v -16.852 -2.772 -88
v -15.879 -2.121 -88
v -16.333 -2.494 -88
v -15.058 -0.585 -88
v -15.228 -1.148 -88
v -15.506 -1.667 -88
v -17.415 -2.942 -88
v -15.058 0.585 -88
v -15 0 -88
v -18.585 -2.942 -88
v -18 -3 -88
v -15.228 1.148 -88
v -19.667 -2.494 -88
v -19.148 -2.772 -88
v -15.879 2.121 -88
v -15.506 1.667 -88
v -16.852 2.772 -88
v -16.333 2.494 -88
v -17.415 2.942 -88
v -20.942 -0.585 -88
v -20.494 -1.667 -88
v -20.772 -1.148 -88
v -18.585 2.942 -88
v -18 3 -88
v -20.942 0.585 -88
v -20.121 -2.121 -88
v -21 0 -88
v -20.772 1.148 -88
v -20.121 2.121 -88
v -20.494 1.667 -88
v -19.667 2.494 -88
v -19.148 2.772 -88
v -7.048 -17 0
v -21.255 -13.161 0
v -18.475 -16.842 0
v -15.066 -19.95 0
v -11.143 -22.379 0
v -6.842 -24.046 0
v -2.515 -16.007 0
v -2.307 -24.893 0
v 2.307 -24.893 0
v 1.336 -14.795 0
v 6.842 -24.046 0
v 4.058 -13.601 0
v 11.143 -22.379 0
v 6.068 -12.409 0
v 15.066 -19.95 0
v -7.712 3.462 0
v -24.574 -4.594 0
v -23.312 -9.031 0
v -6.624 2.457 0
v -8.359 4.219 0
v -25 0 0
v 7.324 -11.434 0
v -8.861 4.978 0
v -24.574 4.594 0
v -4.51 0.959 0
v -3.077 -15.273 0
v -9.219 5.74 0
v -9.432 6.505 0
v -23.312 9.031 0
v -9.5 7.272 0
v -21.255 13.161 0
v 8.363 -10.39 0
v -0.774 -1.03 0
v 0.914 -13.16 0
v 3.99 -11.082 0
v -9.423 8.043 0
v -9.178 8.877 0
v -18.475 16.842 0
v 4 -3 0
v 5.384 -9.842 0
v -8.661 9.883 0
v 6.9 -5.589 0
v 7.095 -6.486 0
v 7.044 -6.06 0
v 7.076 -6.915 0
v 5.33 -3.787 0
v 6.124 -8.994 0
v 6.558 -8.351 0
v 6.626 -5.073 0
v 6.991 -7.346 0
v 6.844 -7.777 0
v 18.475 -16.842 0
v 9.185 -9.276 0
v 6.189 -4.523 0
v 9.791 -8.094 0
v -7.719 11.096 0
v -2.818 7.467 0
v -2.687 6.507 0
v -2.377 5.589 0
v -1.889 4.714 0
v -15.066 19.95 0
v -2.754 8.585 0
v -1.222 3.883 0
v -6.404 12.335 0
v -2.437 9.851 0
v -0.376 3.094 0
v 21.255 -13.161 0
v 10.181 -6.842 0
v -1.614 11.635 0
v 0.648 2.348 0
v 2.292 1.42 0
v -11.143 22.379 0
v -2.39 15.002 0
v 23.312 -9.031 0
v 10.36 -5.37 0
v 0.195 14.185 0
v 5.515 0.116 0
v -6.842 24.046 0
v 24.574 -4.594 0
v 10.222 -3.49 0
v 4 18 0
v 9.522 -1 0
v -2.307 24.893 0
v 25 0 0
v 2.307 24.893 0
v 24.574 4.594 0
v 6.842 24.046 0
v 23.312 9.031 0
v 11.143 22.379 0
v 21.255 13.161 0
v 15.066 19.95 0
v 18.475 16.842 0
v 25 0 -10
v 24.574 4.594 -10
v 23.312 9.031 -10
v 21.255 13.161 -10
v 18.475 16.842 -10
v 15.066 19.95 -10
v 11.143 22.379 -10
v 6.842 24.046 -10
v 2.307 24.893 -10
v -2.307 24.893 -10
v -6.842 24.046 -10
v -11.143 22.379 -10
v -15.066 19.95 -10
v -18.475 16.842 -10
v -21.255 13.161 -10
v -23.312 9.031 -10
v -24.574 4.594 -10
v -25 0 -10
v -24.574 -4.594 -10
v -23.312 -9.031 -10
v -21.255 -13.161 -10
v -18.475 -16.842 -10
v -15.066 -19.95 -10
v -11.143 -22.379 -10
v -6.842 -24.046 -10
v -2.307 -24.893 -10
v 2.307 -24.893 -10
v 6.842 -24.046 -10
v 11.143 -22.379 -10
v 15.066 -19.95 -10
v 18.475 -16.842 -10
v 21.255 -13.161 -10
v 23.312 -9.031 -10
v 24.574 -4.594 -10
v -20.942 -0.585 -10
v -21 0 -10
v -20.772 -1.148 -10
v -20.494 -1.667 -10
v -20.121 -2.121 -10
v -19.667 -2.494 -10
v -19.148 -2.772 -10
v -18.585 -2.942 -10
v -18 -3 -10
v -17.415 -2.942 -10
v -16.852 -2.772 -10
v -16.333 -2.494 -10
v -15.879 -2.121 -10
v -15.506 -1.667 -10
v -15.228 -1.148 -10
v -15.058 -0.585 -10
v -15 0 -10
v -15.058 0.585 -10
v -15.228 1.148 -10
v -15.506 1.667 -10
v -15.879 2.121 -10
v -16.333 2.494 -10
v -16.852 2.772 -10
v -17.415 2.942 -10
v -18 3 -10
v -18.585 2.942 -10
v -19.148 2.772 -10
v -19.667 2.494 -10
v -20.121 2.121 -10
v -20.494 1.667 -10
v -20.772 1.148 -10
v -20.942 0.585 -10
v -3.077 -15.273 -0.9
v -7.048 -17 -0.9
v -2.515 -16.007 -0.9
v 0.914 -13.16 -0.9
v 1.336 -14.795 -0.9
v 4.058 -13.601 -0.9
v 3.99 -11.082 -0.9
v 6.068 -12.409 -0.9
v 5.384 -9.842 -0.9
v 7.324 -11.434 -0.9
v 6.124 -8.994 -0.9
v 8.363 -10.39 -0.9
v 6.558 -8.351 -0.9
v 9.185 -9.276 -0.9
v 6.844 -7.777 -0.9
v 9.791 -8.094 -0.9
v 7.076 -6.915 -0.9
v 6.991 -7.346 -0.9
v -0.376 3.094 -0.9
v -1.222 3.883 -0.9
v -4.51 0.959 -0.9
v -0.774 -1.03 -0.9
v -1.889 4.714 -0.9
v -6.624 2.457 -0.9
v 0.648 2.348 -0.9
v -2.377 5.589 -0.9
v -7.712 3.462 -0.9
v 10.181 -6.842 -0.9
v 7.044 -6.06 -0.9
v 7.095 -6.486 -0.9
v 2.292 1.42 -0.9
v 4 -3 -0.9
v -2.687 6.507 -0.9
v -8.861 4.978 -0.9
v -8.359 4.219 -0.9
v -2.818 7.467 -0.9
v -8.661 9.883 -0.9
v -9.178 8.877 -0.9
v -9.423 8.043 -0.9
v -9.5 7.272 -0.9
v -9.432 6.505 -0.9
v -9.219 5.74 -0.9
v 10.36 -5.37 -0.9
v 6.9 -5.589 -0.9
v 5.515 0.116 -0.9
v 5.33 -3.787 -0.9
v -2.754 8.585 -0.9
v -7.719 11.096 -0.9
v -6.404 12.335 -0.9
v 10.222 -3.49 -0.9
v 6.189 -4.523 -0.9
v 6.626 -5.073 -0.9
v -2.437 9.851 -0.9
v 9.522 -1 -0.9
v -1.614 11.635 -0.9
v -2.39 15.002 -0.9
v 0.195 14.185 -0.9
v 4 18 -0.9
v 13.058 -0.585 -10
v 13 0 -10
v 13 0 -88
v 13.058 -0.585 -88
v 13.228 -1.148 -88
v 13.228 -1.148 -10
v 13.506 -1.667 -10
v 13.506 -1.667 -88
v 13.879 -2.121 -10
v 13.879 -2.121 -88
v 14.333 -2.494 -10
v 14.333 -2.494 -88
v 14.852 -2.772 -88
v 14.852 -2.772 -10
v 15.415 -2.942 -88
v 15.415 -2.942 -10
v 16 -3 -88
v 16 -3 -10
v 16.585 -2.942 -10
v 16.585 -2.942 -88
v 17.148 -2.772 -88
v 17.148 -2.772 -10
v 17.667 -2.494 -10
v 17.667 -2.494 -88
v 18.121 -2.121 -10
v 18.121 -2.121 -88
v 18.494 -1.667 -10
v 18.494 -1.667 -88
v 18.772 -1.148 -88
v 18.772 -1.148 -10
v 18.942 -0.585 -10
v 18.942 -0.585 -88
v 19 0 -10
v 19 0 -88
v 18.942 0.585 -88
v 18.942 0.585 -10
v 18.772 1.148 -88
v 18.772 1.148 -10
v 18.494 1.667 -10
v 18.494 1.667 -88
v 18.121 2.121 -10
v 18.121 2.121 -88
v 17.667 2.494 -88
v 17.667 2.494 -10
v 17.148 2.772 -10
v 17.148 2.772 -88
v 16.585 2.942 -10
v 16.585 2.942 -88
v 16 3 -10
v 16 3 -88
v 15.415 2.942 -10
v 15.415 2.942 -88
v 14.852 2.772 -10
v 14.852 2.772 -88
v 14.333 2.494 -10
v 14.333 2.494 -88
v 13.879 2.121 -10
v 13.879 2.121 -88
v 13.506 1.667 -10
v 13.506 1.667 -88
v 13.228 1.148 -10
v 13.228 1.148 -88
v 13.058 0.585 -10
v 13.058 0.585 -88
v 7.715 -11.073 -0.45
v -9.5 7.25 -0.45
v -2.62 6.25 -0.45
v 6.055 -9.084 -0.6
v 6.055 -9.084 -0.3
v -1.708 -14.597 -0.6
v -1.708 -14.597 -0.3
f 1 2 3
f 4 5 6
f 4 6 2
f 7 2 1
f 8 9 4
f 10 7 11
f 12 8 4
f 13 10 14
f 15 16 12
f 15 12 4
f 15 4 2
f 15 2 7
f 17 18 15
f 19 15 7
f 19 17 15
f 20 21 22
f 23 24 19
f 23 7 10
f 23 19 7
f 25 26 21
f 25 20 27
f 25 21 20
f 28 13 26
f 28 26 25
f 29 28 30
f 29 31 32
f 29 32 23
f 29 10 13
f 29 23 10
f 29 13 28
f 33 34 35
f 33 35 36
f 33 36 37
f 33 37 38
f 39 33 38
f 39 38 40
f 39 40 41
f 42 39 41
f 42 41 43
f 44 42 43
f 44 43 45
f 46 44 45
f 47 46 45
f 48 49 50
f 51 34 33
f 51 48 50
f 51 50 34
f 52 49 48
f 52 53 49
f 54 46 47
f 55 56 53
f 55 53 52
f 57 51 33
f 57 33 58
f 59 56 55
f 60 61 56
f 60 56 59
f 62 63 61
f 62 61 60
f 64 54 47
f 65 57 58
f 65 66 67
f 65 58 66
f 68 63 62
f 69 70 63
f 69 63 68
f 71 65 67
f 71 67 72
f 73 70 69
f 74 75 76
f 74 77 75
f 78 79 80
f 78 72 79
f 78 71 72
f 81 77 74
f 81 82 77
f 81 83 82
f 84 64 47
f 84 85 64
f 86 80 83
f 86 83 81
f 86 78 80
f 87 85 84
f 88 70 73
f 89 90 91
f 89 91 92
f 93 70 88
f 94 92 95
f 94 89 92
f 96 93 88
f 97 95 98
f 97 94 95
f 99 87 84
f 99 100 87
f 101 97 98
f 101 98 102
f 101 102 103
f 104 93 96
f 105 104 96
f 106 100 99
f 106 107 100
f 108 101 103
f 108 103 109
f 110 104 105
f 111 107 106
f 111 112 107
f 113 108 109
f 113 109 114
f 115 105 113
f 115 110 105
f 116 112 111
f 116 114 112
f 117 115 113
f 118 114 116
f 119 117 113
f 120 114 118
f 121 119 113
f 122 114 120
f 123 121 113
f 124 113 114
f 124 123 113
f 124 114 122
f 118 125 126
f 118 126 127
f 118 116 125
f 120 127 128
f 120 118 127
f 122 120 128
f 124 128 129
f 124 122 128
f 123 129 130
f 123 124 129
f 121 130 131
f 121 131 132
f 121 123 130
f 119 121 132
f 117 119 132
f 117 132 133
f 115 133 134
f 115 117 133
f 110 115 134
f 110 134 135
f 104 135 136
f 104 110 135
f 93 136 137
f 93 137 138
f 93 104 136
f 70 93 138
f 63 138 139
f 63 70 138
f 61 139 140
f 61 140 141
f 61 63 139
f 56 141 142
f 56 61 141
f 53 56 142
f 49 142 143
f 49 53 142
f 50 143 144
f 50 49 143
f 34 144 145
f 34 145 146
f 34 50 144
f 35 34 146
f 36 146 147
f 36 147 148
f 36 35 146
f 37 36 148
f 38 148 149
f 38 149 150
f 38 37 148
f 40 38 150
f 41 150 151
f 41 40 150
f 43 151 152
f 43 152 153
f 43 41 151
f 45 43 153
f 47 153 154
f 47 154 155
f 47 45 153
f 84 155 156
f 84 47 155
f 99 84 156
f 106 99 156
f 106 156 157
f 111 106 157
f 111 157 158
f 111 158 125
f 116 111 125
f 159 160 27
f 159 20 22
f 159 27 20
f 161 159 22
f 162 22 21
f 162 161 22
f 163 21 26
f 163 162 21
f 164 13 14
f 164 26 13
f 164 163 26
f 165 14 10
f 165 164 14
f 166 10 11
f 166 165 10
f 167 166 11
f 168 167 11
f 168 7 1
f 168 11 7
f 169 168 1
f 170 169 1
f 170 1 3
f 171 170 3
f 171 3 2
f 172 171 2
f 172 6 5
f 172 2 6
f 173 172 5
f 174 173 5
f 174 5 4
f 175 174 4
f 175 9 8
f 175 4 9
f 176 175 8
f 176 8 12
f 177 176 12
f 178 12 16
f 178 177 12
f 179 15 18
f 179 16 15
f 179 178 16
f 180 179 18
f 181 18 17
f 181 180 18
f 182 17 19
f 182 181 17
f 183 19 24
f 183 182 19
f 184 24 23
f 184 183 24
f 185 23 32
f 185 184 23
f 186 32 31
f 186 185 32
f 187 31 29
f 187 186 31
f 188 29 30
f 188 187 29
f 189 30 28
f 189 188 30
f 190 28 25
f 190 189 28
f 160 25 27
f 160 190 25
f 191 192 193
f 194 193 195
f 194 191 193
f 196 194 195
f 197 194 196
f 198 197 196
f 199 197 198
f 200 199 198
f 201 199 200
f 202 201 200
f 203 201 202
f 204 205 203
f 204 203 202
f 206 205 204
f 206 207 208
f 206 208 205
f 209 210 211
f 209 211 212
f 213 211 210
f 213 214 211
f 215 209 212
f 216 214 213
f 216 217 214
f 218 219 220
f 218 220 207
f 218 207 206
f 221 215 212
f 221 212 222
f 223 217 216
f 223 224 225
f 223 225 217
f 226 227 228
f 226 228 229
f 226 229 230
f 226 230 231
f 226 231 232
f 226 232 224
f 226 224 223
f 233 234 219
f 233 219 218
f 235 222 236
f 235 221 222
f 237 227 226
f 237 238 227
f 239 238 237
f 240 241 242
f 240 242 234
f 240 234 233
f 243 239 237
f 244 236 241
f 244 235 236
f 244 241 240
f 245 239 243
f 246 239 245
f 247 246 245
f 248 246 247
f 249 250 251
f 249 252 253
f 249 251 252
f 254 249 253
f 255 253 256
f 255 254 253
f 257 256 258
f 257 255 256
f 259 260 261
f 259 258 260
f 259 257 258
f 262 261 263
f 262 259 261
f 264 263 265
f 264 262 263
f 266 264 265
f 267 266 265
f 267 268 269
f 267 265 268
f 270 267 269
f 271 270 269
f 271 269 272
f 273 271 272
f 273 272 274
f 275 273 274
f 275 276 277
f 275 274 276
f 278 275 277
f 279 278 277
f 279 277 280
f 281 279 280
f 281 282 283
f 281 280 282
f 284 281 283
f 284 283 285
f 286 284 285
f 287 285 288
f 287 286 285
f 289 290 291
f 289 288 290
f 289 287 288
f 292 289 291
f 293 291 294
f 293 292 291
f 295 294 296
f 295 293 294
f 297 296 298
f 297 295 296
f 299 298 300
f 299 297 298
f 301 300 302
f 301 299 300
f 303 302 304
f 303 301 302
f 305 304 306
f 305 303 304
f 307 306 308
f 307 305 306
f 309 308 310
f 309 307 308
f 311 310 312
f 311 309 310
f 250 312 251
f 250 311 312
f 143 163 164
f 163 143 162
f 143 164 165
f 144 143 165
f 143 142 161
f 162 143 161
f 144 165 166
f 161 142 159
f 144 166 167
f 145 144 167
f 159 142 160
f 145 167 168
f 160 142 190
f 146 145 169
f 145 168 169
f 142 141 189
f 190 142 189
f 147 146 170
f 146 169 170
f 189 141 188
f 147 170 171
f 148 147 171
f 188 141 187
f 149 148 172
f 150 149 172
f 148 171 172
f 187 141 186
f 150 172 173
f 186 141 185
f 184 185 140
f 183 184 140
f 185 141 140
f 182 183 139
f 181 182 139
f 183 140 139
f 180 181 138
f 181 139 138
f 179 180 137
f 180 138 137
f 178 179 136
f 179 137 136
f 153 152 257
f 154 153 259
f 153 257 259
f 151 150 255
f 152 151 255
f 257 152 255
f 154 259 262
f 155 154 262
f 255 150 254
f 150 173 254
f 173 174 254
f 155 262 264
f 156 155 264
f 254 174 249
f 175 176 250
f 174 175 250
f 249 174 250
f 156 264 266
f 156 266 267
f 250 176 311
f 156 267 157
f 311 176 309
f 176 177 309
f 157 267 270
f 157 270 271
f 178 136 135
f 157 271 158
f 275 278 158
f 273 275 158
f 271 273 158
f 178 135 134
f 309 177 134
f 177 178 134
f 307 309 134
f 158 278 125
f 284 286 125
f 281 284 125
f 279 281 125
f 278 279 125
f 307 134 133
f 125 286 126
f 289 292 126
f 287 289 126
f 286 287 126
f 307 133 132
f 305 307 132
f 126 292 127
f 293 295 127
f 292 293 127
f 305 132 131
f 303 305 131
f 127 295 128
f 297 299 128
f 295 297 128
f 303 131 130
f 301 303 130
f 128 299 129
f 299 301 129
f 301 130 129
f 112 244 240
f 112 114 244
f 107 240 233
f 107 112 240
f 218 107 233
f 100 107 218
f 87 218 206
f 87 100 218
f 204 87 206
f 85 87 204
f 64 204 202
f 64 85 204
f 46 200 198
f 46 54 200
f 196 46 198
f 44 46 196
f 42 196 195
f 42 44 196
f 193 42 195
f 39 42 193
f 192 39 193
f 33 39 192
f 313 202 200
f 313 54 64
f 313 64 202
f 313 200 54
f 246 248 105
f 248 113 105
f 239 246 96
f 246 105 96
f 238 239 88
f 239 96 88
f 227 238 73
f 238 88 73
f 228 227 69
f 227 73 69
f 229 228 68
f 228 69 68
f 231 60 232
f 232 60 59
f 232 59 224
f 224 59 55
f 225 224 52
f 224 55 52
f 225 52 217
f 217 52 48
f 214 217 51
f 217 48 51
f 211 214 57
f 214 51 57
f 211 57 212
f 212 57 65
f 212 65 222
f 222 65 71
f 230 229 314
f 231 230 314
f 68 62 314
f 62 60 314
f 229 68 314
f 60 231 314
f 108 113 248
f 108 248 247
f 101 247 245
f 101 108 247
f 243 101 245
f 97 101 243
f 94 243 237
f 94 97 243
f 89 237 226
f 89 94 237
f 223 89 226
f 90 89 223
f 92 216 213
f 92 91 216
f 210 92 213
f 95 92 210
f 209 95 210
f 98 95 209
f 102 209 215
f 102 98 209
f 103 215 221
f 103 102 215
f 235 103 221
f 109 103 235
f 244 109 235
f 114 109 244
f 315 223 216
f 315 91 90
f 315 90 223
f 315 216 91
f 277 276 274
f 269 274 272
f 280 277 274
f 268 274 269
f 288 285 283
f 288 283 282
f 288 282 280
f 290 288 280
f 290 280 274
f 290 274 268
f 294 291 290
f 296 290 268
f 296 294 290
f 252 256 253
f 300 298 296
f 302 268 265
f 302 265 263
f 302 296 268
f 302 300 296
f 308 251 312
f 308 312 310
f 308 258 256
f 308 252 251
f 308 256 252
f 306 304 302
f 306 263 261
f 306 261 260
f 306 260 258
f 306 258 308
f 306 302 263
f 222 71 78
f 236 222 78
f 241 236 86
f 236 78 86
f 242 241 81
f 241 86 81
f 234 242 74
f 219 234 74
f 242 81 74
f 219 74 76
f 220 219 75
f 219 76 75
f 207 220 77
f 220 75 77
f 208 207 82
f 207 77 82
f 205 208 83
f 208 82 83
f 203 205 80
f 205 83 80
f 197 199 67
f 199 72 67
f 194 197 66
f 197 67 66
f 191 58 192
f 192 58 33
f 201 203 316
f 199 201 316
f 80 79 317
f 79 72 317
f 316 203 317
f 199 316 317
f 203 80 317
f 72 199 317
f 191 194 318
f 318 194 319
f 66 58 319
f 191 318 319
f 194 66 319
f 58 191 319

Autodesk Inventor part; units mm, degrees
ref_plane "YZ Plane" through (0, 0, 0) normal (1, 0, 0) x (0, 1, 0)
ref_plane "XZ Plane" through (0, 0, 0) normal (0, 1, 0) x (-1, 0, 0)
ref_plane "XY Plane" through (0, 0, 0) normal (0, 0, 1) x (1, 0, 0)
sketch "Sketch1" plane through (0, 0, 0) normal (0, 0, 1) x (1, 0, 0)
  circle A0 centre (0, 0) radius 25
  line L0 (9.0545, 19) -> (-15.9277, 6.5172) construction
  line L1 (-15.9277, 6.5172) -> (4.4593, -0.1187) construction
  line L2 (4.4593, -0.1187) -> (8.9648, -0.1187) construction
  line L3 (8.9648, -0.1187) -> (-5.7342, -19.5656) construction
  line L4 (-5.7342, -19.5656) -> (-5.7342, -19.5656) construction
  spline S0 degree 4 poles (9.0545, 19) (-15.9277, 6.5172) (4.4593, -0.1187) (8.9648, -0.1187) (-5.7195, -19.5462) (-5.7342, -19.5656) knots 1 1 1 1 1 2 3 3 3 3 3
  line L5 (9.0545, 19) -> (1.8467, 5.2615) construction
  line L6 (1.8467, 5.2615) -> (8.9648, -0.1187) construction
  line L7 (8.9648, -0.1187) -> (9.0545, 0) construction
  line L8 (9.0545, 0) -> (4.4598, -12) construction
  line L9 (4.4598, -12) -> (-5.7342, -19.5656) construction
  spline S1 degree 4 poles (9.0545, 19) (1.8467, 5.2615) (8.9648, -0.1187) (9.0545, 0) (4.4598, -12) (-5.7342, -19.5656) knots 1 1 1 1 1 2 3 3 3 3 3
extrude "Extrusion1" add sketch "Sketch1" against normal blind 10 contours A0 | S1 S0
sketch "Sketch2" plane through (0, 0, 0) normal (0, 0, 1) x (1, 0, 0)
  line L0 (4, 18) -> (-23, 7) construction
  line L1 (-23, 7) -> (4, -3) construction
  spline S0 degree 2 poles (4, 18) (-23, 7) (4, -3) knots 1 1 1 2 2 2
  line L2 (4, -3) -> (15.0435, -8.5217) construction
  line L3 (15.0435, -8.5217) -> (-7, -17) construction
  line L4 (-7, -17) -> (-7.0477, -17) construction
  spline S1 degree 3 poles (4, -3) (15.0435, -8.5217) (-7, -17) (-7.0477, -17) knots 1 1 1 1 2 2 2 2
  line L5 (4, 18) -> (-12, 4) construction
  line L6 (-12, 4) -> (9.5217, -1) construction
  spline S2 degree 2 poles (4, 18) (-12, 4) (9.5217, -1) knots 1 1 1 2 2 2
  line L7 (9.5217, -1) -> (14.1934, -13.1463) construction
  line L8 (14.1934, -13.1463) -> (-7.0477, -17) construction
  spline S3 degree 2 poles (9.5217, -1) (14.1934, -13.1463) (-7.0477, -17) knots 1 1 1 2 2 2
  point P0 (0, 0)
extrude "Extrusion2" cut sketch "Sketch2" against normal blind 0.9
sketch "Sketch3" plane through (0, 0, -10) normal (0, 0, -1) x (-1, 0, 0)
  circle A0 centre (-16, 0) radius 3
  circle A1 centre (18, 0) radius 3
  point P0 (0, 0)
extrude "Extrusion3" add sketch "Sketch3" along normal blind 78
properties part number "Photoresistor"
